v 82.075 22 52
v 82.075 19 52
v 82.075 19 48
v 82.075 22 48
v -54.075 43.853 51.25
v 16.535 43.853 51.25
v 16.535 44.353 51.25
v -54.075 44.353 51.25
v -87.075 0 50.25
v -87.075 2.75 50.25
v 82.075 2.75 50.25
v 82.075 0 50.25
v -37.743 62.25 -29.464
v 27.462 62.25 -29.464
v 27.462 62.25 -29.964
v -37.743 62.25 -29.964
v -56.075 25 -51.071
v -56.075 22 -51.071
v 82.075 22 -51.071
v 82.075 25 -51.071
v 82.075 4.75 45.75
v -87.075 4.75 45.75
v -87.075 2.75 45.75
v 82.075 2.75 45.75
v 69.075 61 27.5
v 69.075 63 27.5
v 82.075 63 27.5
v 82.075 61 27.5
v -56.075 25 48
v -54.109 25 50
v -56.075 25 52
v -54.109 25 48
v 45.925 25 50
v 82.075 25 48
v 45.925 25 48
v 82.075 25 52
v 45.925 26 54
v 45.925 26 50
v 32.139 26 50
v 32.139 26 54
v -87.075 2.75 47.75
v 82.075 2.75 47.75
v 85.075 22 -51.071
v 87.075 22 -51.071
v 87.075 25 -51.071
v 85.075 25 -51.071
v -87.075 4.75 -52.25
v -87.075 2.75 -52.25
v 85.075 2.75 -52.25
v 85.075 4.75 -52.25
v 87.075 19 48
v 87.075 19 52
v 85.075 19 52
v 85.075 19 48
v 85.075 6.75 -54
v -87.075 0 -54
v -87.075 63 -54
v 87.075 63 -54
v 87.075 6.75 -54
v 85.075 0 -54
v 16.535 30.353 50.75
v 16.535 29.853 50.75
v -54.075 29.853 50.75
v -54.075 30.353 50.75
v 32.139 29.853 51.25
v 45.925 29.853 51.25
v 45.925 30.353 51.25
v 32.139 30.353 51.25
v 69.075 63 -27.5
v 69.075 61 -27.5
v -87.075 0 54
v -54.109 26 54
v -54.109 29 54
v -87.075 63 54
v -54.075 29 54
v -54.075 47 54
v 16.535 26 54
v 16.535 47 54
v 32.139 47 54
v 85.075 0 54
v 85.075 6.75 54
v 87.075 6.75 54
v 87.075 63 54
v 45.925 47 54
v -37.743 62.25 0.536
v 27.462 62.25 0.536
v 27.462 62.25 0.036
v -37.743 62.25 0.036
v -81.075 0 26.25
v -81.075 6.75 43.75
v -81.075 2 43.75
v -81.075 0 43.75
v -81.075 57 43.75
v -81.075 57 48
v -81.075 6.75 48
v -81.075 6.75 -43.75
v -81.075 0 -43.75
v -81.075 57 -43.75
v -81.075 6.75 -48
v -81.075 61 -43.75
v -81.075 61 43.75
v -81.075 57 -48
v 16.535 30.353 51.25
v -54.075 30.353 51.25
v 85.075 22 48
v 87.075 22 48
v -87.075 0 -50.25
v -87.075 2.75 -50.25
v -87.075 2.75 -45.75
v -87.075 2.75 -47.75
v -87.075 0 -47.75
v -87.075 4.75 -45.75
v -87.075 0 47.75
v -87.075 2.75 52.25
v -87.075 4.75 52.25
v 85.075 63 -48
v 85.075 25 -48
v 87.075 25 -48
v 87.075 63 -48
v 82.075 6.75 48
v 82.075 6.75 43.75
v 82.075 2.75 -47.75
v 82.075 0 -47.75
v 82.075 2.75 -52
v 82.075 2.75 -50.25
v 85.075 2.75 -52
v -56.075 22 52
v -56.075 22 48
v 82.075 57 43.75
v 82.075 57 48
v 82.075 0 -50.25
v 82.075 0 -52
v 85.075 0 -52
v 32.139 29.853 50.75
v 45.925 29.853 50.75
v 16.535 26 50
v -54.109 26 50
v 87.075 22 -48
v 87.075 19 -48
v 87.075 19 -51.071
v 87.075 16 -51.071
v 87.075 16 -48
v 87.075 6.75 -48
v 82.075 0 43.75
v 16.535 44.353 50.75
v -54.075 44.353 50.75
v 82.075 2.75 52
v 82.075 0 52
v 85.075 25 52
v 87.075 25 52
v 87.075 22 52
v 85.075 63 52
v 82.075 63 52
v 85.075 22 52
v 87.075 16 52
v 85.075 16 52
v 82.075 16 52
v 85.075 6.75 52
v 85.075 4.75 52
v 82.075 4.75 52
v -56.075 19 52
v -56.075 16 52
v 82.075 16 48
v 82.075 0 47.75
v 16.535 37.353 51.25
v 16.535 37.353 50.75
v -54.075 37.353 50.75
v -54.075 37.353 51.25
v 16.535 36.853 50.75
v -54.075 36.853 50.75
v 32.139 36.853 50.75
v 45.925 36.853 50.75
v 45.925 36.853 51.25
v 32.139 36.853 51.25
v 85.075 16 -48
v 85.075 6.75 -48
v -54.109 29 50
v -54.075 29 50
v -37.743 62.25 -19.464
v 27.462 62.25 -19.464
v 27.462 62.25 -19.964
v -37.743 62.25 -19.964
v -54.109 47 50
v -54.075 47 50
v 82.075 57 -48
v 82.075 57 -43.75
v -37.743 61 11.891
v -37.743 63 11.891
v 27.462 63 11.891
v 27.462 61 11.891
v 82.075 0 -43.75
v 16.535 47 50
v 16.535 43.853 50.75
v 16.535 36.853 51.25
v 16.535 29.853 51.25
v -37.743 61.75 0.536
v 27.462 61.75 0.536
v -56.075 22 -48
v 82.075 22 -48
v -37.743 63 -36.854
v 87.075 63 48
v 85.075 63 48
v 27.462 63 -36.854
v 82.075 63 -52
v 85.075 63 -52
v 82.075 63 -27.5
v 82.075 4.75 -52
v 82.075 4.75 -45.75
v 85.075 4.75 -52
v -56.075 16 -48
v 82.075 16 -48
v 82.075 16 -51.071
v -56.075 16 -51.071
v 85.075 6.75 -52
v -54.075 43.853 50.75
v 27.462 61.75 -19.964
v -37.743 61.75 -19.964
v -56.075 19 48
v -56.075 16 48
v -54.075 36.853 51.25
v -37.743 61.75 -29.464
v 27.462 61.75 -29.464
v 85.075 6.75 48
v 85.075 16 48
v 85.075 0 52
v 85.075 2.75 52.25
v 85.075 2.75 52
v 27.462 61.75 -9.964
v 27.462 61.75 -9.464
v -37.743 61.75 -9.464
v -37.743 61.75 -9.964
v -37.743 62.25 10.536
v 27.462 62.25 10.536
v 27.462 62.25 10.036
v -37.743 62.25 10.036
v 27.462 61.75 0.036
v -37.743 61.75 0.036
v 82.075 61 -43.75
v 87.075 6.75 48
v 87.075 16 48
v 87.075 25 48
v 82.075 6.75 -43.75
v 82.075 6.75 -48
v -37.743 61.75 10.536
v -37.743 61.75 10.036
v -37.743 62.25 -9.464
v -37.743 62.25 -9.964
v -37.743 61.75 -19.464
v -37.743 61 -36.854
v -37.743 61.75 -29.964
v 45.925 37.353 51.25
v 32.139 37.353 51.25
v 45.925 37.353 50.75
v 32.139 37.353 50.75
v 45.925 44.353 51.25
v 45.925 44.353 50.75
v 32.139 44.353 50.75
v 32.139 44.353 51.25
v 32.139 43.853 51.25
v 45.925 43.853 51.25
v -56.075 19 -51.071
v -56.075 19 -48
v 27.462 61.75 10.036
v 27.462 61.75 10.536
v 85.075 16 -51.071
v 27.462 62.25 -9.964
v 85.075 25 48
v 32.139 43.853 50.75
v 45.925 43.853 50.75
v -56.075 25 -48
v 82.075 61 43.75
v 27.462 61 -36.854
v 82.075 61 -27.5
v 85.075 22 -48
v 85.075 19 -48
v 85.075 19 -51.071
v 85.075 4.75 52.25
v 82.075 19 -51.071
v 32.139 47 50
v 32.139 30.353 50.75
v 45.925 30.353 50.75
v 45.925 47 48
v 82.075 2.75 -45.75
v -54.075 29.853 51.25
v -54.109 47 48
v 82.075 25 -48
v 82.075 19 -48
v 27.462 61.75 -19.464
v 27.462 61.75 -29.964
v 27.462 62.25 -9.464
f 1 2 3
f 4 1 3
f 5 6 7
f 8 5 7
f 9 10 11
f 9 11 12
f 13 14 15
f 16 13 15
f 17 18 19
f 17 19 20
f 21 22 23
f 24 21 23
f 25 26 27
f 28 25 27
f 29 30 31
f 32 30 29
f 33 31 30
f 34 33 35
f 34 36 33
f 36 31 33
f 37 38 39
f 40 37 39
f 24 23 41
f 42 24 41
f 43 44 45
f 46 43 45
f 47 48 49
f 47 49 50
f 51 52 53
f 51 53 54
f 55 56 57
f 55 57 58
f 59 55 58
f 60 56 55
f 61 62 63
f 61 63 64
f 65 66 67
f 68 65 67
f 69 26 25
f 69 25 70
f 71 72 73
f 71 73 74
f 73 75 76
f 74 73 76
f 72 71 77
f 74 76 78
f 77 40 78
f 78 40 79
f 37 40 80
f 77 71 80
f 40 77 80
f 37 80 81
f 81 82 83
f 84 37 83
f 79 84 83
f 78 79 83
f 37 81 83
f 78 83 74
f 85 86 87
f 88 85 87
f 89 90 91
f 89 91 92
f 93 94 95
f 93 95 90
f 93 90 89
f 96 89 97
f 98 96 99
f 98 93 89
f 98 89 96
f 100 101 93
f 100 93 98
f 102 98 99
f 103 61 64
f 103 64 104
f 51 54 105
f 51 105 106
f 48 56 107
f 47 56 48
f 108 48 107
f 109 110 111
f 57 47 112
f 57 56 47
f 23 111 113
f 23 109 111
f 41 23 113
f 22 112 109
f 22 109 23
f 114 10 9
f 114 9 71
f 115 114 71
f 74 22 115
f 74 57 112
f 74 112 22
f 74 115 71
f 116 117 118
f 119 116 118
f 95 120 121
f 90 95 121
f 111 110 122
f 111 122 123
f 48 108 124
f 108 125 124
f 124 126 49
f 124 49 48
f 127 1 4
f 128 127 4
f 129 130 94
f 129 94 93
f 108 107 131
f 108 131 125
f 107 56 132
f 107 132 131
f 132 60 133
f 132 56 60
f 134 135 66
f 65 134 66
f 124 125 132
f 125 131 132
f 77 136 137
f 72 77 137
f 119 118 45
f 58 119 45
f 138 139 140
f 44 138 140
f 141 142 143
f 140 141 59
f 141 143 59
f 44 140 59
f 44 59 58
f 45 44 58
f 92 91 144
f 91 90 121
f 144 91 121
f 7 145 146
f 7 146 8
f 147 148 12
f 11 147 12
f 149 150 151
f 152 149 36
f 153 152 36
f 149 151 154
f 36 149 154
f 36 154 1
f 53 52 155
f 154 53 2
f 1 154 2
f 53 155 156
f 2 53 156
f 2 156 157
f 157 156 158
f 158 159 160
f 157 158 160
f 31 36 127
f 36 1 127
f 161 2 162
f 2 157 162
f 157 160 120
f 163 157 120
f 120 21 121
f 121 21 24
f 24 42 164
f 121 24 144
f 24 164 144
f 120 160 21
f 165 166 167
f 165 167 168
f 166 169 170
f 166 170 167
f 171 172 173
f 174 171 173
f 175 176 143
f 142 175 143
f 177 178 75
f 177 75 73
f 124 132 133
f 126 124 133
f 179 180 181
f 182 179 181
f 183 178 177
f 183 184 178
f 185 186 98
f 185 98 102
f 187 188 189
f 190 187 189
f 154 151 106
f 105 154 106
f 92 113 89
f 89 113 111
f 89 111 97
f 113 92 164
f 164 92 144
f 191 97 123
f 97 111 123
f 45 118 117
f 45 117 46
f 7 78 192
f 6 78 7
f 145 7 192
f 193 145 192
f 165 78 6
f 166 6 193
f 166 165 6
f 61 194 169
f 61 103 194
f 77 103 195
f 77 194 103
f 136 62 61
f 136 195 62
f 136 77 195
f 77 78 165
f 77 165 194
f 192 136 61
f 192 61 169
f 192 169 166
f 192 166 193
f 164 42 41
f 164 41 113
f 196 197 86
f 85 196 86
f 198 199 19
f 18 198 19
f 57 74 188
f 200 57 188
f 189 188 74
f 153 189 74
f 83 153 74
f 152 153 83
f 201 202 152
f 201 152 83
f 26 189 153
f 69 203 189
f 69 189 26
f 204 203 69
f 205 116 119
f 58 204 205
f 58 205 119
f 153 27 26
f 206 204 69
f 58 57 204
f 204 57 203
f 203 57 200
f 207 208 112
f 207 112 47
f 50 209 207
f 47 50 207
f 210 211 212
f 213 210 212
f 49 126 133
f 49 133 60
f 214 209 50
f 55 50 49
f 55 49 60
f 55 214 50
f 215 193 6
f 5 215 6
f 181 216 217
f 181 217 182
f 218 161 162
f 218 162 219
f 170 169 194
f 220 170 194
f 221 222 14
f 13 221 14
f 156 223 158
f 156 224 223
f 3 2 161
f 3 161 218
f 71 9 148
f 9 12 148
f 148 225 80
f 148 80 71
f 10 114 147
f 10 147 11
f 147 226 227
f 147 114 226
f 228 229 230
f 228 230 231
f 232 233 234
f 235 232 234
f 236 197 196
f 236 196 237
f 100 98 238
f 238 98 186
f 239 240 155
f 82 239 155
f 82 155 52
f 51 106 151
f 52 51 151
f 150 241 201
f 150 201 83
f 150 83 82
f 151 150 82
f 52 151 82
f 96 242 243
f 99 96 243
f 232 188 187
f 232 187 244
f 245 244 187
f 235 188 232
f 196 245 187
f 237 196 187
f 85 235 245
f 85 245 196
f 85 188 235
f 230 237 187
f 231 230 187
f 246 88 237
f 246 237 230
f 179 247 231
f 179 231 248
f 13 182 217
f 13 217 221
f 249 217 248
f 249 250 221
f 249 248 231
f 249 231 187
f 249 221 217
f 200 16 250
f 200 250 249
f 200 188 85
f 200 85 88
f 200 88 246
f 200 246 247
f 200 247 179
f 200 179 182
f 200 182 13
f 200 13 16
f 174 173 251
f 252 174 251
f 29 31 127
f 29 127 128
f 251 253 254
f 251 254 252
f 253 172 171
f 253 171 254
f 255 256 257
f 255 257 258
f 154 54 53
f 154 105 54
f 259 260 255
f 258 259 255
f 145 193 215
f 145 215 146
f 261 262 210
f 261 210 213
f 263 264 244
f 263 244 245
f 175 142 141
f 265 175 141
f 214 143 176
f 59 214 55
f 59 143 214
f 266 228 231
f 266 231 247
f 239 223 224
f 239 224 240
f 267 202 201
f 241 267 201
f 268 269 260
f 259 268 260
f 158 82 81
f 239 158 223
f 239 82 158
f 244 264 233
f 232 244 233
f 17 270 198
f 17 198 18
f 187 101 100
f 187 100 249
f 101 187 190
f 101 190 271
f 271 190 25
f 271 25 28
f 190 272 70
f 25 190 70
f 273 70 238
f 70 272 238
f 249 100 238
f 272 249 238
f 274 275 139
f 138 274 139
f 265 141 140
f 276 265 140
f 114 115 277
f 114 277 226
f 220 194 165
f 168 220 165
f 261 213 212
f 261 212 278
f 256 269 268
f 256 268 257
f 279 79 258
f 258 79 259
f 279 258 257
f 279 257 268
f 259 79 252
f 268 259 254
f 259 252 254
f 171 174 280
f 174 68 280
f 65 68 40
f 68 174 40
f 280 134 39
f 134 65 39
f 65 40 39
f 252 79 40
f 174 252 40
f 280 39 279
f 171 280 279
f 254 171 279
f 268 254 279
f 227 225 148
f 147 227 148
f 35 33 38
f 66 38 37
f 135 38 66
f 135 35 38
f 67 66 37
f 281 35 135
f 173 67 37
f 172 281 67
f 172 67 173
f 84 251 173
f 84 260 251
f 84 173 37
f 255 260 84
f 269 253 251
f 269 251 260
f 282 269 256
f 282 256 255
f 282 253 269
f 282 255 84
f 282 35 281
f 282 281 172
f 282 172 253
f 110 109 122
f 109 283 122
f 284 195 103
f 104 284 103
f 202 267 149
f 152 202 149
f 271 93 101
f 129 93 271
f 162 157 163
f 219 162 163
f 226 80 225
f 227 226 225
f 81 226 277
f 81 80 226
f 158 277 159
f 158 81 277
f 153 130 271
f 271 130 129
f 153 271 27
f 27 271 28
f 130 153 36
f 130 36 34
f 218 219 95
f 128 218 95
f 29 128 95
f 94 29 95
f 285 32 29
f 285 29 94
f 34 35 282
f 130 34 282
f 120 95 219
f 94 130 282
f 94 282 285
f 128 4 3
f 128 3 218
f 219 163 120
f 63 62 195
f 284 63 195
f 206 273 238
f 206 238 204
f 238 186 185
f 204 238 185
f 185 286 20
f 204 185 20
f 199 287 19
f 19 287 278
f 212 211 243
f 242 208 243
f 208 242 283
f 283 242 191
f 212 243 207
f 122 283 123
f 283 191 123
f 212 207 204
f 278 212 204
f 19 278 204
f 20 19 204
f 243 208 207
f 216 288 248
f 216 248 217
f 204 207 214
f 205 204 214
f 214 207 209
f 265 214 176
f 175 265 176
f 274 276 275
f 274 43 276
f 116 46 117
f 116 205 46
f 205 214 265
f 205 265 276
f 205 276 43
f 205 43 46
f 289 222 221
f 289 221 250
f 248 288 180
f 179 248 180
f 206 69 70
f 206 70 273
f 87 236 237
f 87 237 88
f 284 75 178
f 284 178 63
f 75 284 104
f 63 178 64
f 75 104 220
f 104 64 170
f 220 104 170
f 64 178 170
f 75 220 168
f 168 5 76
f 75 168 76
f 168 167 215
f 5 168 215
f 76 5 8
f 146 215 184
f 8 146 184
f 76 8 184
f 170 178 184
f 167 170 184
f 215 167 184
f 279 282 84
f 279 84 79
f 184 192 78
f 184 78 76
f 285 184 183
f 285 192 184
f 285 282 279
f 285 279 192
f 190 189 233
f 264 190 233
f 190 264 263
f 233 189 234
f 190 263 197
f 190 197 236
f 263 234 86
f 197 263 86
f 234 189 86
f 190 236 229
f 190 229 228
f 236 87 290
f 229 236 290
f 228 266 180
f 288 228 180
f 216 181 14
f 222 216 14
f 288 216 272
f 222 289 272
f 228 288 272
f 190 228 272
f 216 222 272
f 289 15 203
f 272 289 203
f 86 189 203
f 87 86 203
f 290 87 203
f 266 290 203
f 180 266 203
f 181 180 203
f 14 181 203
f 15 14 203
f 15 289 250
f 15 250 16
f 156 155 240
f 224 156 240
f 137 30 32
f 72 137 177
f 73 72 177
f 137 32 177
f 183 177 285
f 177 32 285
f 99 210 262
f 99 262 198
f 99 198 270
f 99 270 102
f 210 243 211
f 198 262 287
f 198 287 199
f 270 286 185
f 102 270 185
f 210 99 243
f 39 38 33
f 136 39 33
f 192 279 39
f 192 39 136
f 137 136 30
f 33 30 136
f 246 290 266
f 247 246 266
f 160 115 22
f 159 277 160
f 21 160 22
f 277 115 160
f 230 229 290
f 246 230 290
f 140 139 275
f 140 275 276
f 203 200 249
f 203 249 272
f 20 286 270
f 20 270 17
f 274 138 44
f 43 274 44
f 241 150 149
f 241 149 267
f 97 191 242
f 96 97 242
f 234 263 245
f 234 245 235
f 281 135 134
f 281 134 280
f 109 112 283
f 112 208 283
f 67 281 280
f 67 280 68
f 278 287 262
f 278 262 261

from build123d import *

# Parameters (mm, degrees)
SKETCH_1_W           = 174.15
SKETCH_1_H           = 108
EXTRUDE_1_DEPTH      = 63
CUT_EXTRUDE_2_DEPTH  = 174.15
CUT_EXTRUDE_3_REACH  = 122.279
SKETCH_6_W           = 2
SKETCH_6_H           = 108
SKETCH_7_W           = 96
SKETCH_7_H           = 50.25
CUT_EXTRUDE_5_DEPTH  = 168.15
SKETCH_8_W           = 87.5
SKETCH_8_H           = 4.75
CUT_EXTRUDE_6_DEPTH  = 168.15
SKETCH_10_W          = 168.15
SKETCH_10_H          = 87.5
CUT_EXTRUDE_8_DEPTH  = 59
SKETCH_12_W          = 168.15
SKETCH_12_H          = 96
EXTRUDE_2_DEPTH      = 2
SKETCH_15_W          = 25
SKETCH_15_H          = 70
SKETCH_15_W_2        = 55
SKETCH_15_H_2        = 20
SKETCH_15_W_3        = 44.398131355
SKETCH_15_H_3        = 87.5
CUT_EXTRUDE_9_DEPTH  = 2
SKETCH_16_W          = 25
SKETCH_16_H          = 96
SKETCH_16_W_2        = 32.283516817
CUT_EXTRUDE_10_DEPTH = 2
SKETCH_17_W          = 2
SKETCH_17_H          = 96
EXTRUDE_3_DEPTH      = 5
SKETCH_18_W          = 2
SKETCH_18_H          = 87.5
EXTRUDE_4_DEPTH      = 5
SKETCH_19_W          = 100
SKETCH_19_H          = 18
CUT_EXTRUDE_11_DEPTH = 6
SKETCH_23_W          = 65.205598619
SKETCH_23_H          = 48.744694075
CUT_EXTRUDE_13_DEPTH = 2
CUT_EXTRUDE_START    = -63
CUT_EXTRUDE_14_DEPTH = 63
SKETCH_28_W          = 2
SKETCH_28_H          = 4.25
EXTRUDE_6_DEPTH      = 4.75
SKETCH_31_W          = 13
SKETCH_31_H          = 55
CUT_EXTRUDE_15_DEPTH = 10
SKETCH_34_W          = 103.070926165
SKETCH_34_H          = 3
CUT_EXTRUDE_16_DEPTH = 143.15
SKETCH_37_W          = 96
SKETCH_37_H          = 4
CUT_EXTRUDE_17_DEPTH = 10
SKETCH_38_W          = 123.751868645
SKETCH_38_H          = 87.5
CUT_EXTRUDE_18_DEPTH = 10
CUT_EXTRUDE_20_REACH = 194.907
SKETCH_42_W          = 103.070926165
SKETCH_42_H          = 3
SKETCH_45_W          = 100.033953054
SKETCH_45_H          = 3
CUT_EXTRUDE_21_DEPTH = 6
SKETCH_46_W          = 15.60461182
SKETCH_46_H          = 6
EXTRUDE_7_DEPTH      = 21
SKETCH_47_W          = 100.033953054
SKETCH_47_H          = 22
CUT_EXTRUDE_22_DEPTH = 2
SKETCH_48_W          = 87.5
SKETCH_48_H          = 5
CUT_EXTRUDE_23_DEPTH = 2
SKETCH_49_W          = 108
SKETCH_49_H          = 6.75
CUT_EXTRUDE_24_DEPTH = 2
EXTRUDE_8_DEPTH      = 2
SKETCH_54_W          = 0.5
SKETCH_54_H          = 0.5
EXTRUDE_10_DEPTH     = 65.205598619
EXTRUDE_11_REACH     = 158.761
SKETCH_55_W          = 0.5
SKETCH_55_H          = 0.5


with BuildPart() as part:
    # 스케치1 → 보스-돌출1 (new body)
    with BuildSketch(Plane(origin=(0, 0, 0), x_dir=(1, 0, 0), z_dir=(0, 1, 0))):
        Rectangle(SKETCH_1_W, SKETCH_1_H)
    extrude(amount=EXTRUDE_1_DEPTH)

    # 스케치5 → 컷-돌출2 (cut)
    with BuildSketch(Plane.ZY.offset(87.075)):
        Polygon((-48, 0), (-47.75, 0), (-47.75, 2.75), (-45.75, 2.75), (-45.75, 4.75), (-52.25, 4.75), (-52.25, 2.75), (-50.25, 2.75), (-50.25, 0), (-50, 0), (-50, 3), (-52, 3), (-52, 4.5), (-46, 4.5), (-46, 3), (-48, 3), align=None)
        Polygon((-50, 0), (-48, 0), (-48, 3), (-46, 3), (-46, 4.5), (-52, 4.5), (-52, 3), (-50, 3), align=None)
        Polygon((50, 3), (50, 0), (50.25, 0), (50.25, 2.75), (52.25, 2.75), (52.25, 4.75), (45.75, 4.75), (45.75, 2.75), (47.75, 2.75), (47.75, 0), (48, 0), (48, 3), (46, 3), (46, 4.5), (52, 4.5), (52, 3), align=None)
        Polygon((48, 0), (50, 0), (50, 3), (52, 3), (52, 4.5), (46, 4.5), (46, 3), (48, 3), align=None)
    extrude(amount=-CUT_EXTRUDE_2_DEPTH, mode=Mode.SUBTRACT)

    # 컷-돌출3: up to this face of the body (flat: up to its plane)
    cut_extrude_3_end = Plane(part.part.faces().sort_by_distance((0, 4.75, 49))[0])
    # 스케치6 → 컷-돌출3 (cut, up to the picked face)
    with BuildSketch(Plane.XZ, mode=Mode.PRIVATE) as cut_extrude_3_sk1:
        with Locations((-86.075, 0)):
            Rectangle(SKETCH_6_W, SKETCH_6_H)
    cut_extrude_3_tool1 = split(extrude(cut_extrude_3_sk1.sketch, amount=-CUT_EXTRUDE_3_REACH, mode=Mode.PRIVATE), bisect_by=cut_extrude_3_end, keep=Keep.BOTH, mode=Mode.PRIVATE)
    add(cut_extrude_3_tool1.solids().sort_by(Axis((-86.075, 0, 0), (0, 1, 0)))[0], mode=Mode.SUBTRACT)

    # 스케치7 → 컷-돌출5 (cut)
    with BuildSketch(Plane(origin=(87.075, 0, 0), x_dir=(0, 0, -1), z_dir=(1, 0, 0))):
        with Locations((0, 31.875)):
            Rectangle(SKETCH_7_W, SKETCH_7_H)
    extrude(amount=-CUT_EXTRUDE_5_DEPTH, mode=Mode.SUBTRACT)

    # 스케치8 → 컷-돌출6 (cut)
    with BuildSketch(Plane(origin=(87.075, 0, 0), x_dir=(0, 0, -1), z_dir=(1, 0, 0))):
        with Locations((0, 4.375)):
            Rectangle(SKETCH_8_W, SKETCH_8_H)
    extrude(amount=-CUT_EXTRUDE_6_DEPTH, mode=Mode.SUBTRACT)

    # 스케치10 → 컷-돌출8 (cut)
    with BuildSketch(Plane(origin=(0, 2, 0), x_dir=(1, 0, 0), z_dir=(0, 1, 0))):
        with Locations((3, 0)):
            Rectangle(SKETCH_10_W, SKETCH_10_H)
    extrude(amount=CUT_EXTRUDE_8_DEPTH, mode=Mode.SUBTRACT)

    # 스케치12 → 보스-돌출2 (add)
    with BuildSketch(Plane(origin=(0, 24, 0), x_dir=(-1, 0, 0), z_dir=(0, -1, 0))):
        with Locations((-3, 0)):
            Rectangle(SKETCH_12_W, SKETCH_12_H)
    extrude(amount=EXTRUDE_2_DEPTH)

    # 스케치15 → 컷-돌출9 (cut)
    with BuildSketch(Plane(origin=(0, 2, 0), x_dir=(1, 0, 0), z_dir=(0, 1, 0))):
        with Locations((-68.575, 8.75)):
            Rectangle(SKETCH_15_W, SKETCH_15_H)
        with Locations((-9.233175572, -33.75)):
            Rectangle(SKETCH_15_W_2, SKETCH_15_H_2)
        with Locations((64.875934323, 0)):
            Rectangle(SKETCH_15_W_3, SKETCH_15_H_3)
    extrude(amount=-CUT_EXTRUDE_9_DEPTH, mode=Mode.SUBTRACT)

    # 스케치16 → 컷-돌출10 (cut)
    with BuildSketch(Plane(origin=(0, 24, 0), x_dir=(1, 0, 0), z_dir=(0, 1, 0))):
        with Locations((-68.575, 0)):
            Rectangle(SKETCH_16_W, SKETCH_16_H)
        with Locations((70.933241592, 0)):
            Rectangle(SKETCH_16_W_2, SKETCH_16_H)
    extrude(amount=-CUT_EXTRUDE_10_DEPTH, mode=Mode.SUBTRACT)

    # 스케치17 → 보스-돌출3 (add)
    with BuildSketch(Plane(origin=(0, 24, 0), x_dir=(1, 0, 0), z_dir=(0, 1, 0))):
        with Locations((-55.075, 0)):
            Rectangle(SKETCH_17_W, SKETCH_17_H)
    extrude(amount=EXTRUDE_3_DEPTH)

    # 스케치18 → 보스-돌출4 (add)
    with BuildSketch(Plane(origin=(0, 2, 0), x_dir=(1, 0, 0), z_dir=(0, 1, 0))):
        with Locations((-55.075, 0)):
            Rectangle(SKETCH_18_W, SKETCH_18_H)
    extrude(amount=EXTRUDE_4_DEPTH)

    # 스케치19 → 컷-돌출11 (cut)
    with BuildSketch(Plane(origin=(0, 0, 48), x_dir=(-1, 0, 0), z_dir=(0, 0, -1))):
        with Locations((4.075, 38)):
            Rectangle(SKETCH_19_W, SKETCH_19_H)
    extrude(amount=-CUT_EXTRUDE_11_DEPTH, mode=Mode.SUBTRACT)

    # 스케치23 → 컷-돌출13 (cut)
    with BuildSketch(Plane(origin=(0, 63, 0), x_dir=(1, 0, 0), z_dir=(0, 1, 0))):
        with Locations((-5.140341164, 12.481591832)):
            Rectangle(SKETCH_23_W, SKETCH_23_H)
    extrude(amount=-CUT_EXTRUDE_13_DEPTH, mode=Mode.SUBTRACT)

    # 스케치26 → 컷-돌출14 (cut)
    with BuildSketch(Plane(origin=(0, 63, 0), x_dir=(1, 0, 0), z_dir=(0, 1, 0)).offset(CUT_EXTRUDE_START)):
        Polygon((82.075, 52), (85.075, 52), (85.075, 48), (87.075, 48), (87.075, -48), (85.075, -48), (85.075, -52), (82.075, -52), align=None)
    extrude(amount=CUT_EXTRUDE_14_DEPTH, mode=Mode.SUBTRACT)

    # 스케치28 → 보스-돌출6 (add)
    with BuildSketch(Plane.XZ.offset(-4.75)):
        with Locations((86.075, 50.125)):
            Rectangle(SKETCH_28_W, SKETCH_28_H)
        with Locations((86.075, -50.125)):
            Rectangle(SKETCH_28_W, SKETCH_28_H)
    extrude(amount=EXTRUDE_6_DEPTH)

    # 스케치31 → 컷-돌출15 (cut)
    with BuildSketch(Plane(origin=(0, 63, 0), x_dir=(1, 0, 0), z_dir=(0, 1, 0))):
        with Locations((75.575, 0)):
            Rectangle(SKETCH_31_W, SKETCH_31_H)
    extrude(amount=-CUT_EXTRUDE_15_DEPTH, mode=Mode.SUBTRACT)

    # 스케치34 → 컷-돌출16 (cut)
    with BuildSketch(Plane(origin=(87.075, 0, 0), x_dir=(0, 0, -1), z_dir=(1, 0, 0))):
        with Locations((-0.464536917, 23.5)):
            Rectangle(SKETCH_34_W, SKETCH_34_H)
    extrude(amount=-CUT_EXTRUDE_16_DEPTH, mode=Mode.SUBTRACT)

    # 스케치37 → 컷-돌출17 (cut)
    with BuildSketch(Plane(origin=(-54.075, 0, 0), x_dir=(0, 0, -1), z_dir=(1, 0, 0))):
        with Locations((0, 27)):
            Rectangle(SKETCH_37_W, SKETCH_37_H)
    extrude(amount=-CUT_EXTRUDE_17_DEPTH, mode=Mode.SUBTRACT)

    # 스케치38 → 컷-돌출18 (cut)
    with BuildSketch(Plane(origin=(0, 2, 0), x_dir=(1, 0, 0), z_dir=(0, 1, 0))):
        with Locations((-19.199065677, 0)):
            Rectangle(SKETCH_38_W, SKETCH_38_H)
    extrude(amount=-CUT_EXTRUDE_18_DEPTH, mode=Mode.SUBTRACT)

    # 컷-돌출20: up to this face of the body (flat: up to its plane)
    cut_extrude_20_end = Plane(part.part.faces().sort_by_distance((-56.075, 23.5, -49.535463082))[0])
    # 스케치42 → 컷-돌출20 (cut, up to the picked face)
    with BuildSketch(Plane(origin=(87.075, 0, 0), x_dir=(0, 0, -1), z_dir=(1, 0, 0)), mode=Mode.PRIVATE) as cut_extrude_20_sk1:
        with Locations((-0.464536917, 17.5)):
            Rectangle(SKETCH_42_W, SKETCH_42_H)
    cut_extrude_20_tool1 = split(extrude(cut_extrude_20_sk1.sketch, amount=-CUT_EXTRUDE_20_REACH, mode=Mode.PRIVATE), bisect_by=cut_extrude_20_end, keep=Keep.BOTH, mode=Mode.PRIVATE)
    add(cut_extrude_20_tool1.solids().sort_by(Axis((87.075, 17.5, 0.464537), (-1, 0, 0)))[0], mode=Mode.SUBTRACT)

    # 스케치45 → 컷-돌출21 (cut)
    with BuildSketch(Plane(origin=(0, 0, 48), x_dir=(-1, 0, 0), z_dir=(0, 0, -1))):
        with Locations((4.091976527, 27.5)):
            Rectangle(SKETCH_45_W, SKETCH_45_H)
    extrude(amount=-CUT_EXTRUDE_21_DEPTH, mode=Mode.SUBTRACT)

    # 스케치46 → 보스-돌출7 (add)
    with BuildSketch(Plane(origin=(0, 26, 0), x_dir=(1, 0, 0), z_dir=(0, 1, 0))):
        with Locations((24.337049492, -51)):
            Rectangle(SKETCH_46_W, SKETCH_46_H)
    extrude(amount=EXTRUDE_7_DEPTH)

    # 스케치47 → 컷-돌출22 (cut)
    with BuildSketch(Plane(origin=(0, 0, 48), x_dir=(-1, 0, 0), z_dir=(0, 0, -1))):
        with Locations((4.091976527, 36)):
            Rectangle(SKETCH_47_W, SKETCH_47_H)
    extrude(amount=-CUT_EXTRUDE_22_DEPTH, mode=Mode.SUBTRACT)

    # 스케치48 → 컷-돌출23 (cut)
    with BuildSketch(Plane(origin=(-54.075, 0, 0), x_dir=(0, 0, -1), z_dir=(1, 0, 0))):
        with Locations((0, 4.5)):
            Rectangle(SKETCH_48_W, SKETCH_48_H)
    extrude(amount=-CUT_EXTRUDE_23_DEPTH, mode=Mode.SUBTRACT)

    # 스케치49 → 컷-돌출24 (cut)
    with BuildSketch(Plane(origin=(87.075, 0, 0), x_dir=(0, 0, -1), z_dir=(1, 0, 0))):
        with Locations((0, 3.375)):
            Rectangle(SKETCH_49_W, SKETCH_49_H)
    extrude(amount=-CUT_EXTRUDE_24_DEPTH, mode=Mode.SUBTRACT)

    # 스케치51 → 보스-돌출8 (add)
    with BuildSketch(Plane.ZY.offset(85.075)):
        Polygon((52.25, 2.75), (50.25, 2.75), (50.25, 0), (54, 0), (54, 4.75), (52.25, 4.75), align=None)
        Polygon((-52.25, 2.75), (-52.25, 4.75), (-54, 4.75), (-54, 0), (-50.25, 0), (-50.25, 2.75), align=None)
        Polygon((47.75, 2.75), (45.75, 2.75), (45.75, 4.75), (-45.75, 4.75), (-45.75, 2.75), (-47.75, 2.75), (-47.75, 0), (47.75, 0), align=None)
    extrude(amount=EXTRUDE_8_DEPTH)

    # 스케치54 → 보스-돌출10 (add)
    with BuildSketch(Plane(origin=(-37.743140474, 0, 0), x_dir=(0, 0, -1), z_dir=(1, 0, 0))):
        with Locations((-10.286427881, 62)):
            Rectangle(SKETCH_54_W, SKETCH_54_H)
        with Locations((-0.286427881, 62)):
            Rectangle(SKETCH_54_W, SKETCH_54_H)
        with Locations((9.713572119, 62)):
            Rectangle(SKETCH_54_W, SKETCH_54_H)
        with Locations((19.713572119, 62)):
            Rectangle(SKETCH_54_W, SKETCH_54_H)
        with Locations((29.713572119, 62)):
            Rectangle(SKETCH_54_W, SKETCH_54_H)
    extrude(amount=EXTRUDE_10_DEPTH)

    # 보스-돌출11: up to this face of the body (flat: up to its plane)
    extrude_11_end = Plane(part.part.faces().sort_by_distance((-87.075, 31.667900174, 0))[0])
    # 스케치55 → 보스-돌출11 (add, up to the picked face)
    with BuildSketch(Plane.ZY.offset(-45.925), mode=Mode.PRIVATE) as extrude_11_sk1:
        with Locations((51, 44.102500149)):
            Rectangle(SKETCH_55_W, SKETCH_55_H)
    extrude_11_tool1 = split(extrude(extrude_11_sk1.sketch, amount=EXTRUDE_11_REACH, mode=Mode.PRIVATE), bisect_by=extrude_11_end, keep=Keep.BOTH, mode=Mode.PRIVATE)
    # 스케치55 → 보스-돌출11 (add, up to the picked face)
    with BuildSketch(Plane.ZY.offset(-45.925), mode=Mode.PRIVATE) as extrude_11_sk2:
        with Locations((51, 37.102500149)):
            Rectangle(SKETCH_55_W, SKETCH_55_H)
    extrude_11_tool2 = split(extrude(extrude_11_sk2.sketch, amount=EXTRUDE_11_REACH, mode=Mode.PRIVATE), bisect_by=extrude_11_end, keep=Keep.BOTH, mode=Mode.PRIVATE)
    # 스케치55 → 보스-돌출11 (add, up to the picked face)
    with BuildSketch(Plane.ZY.offset(-45.925), mode=Mode.PRIVATE) as extrude_11_sk3:
        with Locations((51, 30.102500149)):
            Rectangle(SKETCH_55_W, SKETCH_55_H)
    extrude_11_tool3 = split(extrude(extrude_11_sk3.sketch, amount=EXTRUDE_11_REACH, mode=Mode.PRIVATE), bisect_by=extrude_11_end, keep=Keep.BOTH, mode=Mode.PRIVATE)
    add(extrude_11_tool1.solids().sort_by(Axis((45.925, 44.1025, 51), (-1, 0, 0)))[0])
    add(extrude_11_tool2.solids().sort_by(Axis((45.925, 37.1025, 51), (-1, 0, 0)))[0])
    add(extrude_11_tool3.solids().sort_by(Axis((45.925, 30.1025, 51), (-1, 0, 0)))[0])


solid = part.part
